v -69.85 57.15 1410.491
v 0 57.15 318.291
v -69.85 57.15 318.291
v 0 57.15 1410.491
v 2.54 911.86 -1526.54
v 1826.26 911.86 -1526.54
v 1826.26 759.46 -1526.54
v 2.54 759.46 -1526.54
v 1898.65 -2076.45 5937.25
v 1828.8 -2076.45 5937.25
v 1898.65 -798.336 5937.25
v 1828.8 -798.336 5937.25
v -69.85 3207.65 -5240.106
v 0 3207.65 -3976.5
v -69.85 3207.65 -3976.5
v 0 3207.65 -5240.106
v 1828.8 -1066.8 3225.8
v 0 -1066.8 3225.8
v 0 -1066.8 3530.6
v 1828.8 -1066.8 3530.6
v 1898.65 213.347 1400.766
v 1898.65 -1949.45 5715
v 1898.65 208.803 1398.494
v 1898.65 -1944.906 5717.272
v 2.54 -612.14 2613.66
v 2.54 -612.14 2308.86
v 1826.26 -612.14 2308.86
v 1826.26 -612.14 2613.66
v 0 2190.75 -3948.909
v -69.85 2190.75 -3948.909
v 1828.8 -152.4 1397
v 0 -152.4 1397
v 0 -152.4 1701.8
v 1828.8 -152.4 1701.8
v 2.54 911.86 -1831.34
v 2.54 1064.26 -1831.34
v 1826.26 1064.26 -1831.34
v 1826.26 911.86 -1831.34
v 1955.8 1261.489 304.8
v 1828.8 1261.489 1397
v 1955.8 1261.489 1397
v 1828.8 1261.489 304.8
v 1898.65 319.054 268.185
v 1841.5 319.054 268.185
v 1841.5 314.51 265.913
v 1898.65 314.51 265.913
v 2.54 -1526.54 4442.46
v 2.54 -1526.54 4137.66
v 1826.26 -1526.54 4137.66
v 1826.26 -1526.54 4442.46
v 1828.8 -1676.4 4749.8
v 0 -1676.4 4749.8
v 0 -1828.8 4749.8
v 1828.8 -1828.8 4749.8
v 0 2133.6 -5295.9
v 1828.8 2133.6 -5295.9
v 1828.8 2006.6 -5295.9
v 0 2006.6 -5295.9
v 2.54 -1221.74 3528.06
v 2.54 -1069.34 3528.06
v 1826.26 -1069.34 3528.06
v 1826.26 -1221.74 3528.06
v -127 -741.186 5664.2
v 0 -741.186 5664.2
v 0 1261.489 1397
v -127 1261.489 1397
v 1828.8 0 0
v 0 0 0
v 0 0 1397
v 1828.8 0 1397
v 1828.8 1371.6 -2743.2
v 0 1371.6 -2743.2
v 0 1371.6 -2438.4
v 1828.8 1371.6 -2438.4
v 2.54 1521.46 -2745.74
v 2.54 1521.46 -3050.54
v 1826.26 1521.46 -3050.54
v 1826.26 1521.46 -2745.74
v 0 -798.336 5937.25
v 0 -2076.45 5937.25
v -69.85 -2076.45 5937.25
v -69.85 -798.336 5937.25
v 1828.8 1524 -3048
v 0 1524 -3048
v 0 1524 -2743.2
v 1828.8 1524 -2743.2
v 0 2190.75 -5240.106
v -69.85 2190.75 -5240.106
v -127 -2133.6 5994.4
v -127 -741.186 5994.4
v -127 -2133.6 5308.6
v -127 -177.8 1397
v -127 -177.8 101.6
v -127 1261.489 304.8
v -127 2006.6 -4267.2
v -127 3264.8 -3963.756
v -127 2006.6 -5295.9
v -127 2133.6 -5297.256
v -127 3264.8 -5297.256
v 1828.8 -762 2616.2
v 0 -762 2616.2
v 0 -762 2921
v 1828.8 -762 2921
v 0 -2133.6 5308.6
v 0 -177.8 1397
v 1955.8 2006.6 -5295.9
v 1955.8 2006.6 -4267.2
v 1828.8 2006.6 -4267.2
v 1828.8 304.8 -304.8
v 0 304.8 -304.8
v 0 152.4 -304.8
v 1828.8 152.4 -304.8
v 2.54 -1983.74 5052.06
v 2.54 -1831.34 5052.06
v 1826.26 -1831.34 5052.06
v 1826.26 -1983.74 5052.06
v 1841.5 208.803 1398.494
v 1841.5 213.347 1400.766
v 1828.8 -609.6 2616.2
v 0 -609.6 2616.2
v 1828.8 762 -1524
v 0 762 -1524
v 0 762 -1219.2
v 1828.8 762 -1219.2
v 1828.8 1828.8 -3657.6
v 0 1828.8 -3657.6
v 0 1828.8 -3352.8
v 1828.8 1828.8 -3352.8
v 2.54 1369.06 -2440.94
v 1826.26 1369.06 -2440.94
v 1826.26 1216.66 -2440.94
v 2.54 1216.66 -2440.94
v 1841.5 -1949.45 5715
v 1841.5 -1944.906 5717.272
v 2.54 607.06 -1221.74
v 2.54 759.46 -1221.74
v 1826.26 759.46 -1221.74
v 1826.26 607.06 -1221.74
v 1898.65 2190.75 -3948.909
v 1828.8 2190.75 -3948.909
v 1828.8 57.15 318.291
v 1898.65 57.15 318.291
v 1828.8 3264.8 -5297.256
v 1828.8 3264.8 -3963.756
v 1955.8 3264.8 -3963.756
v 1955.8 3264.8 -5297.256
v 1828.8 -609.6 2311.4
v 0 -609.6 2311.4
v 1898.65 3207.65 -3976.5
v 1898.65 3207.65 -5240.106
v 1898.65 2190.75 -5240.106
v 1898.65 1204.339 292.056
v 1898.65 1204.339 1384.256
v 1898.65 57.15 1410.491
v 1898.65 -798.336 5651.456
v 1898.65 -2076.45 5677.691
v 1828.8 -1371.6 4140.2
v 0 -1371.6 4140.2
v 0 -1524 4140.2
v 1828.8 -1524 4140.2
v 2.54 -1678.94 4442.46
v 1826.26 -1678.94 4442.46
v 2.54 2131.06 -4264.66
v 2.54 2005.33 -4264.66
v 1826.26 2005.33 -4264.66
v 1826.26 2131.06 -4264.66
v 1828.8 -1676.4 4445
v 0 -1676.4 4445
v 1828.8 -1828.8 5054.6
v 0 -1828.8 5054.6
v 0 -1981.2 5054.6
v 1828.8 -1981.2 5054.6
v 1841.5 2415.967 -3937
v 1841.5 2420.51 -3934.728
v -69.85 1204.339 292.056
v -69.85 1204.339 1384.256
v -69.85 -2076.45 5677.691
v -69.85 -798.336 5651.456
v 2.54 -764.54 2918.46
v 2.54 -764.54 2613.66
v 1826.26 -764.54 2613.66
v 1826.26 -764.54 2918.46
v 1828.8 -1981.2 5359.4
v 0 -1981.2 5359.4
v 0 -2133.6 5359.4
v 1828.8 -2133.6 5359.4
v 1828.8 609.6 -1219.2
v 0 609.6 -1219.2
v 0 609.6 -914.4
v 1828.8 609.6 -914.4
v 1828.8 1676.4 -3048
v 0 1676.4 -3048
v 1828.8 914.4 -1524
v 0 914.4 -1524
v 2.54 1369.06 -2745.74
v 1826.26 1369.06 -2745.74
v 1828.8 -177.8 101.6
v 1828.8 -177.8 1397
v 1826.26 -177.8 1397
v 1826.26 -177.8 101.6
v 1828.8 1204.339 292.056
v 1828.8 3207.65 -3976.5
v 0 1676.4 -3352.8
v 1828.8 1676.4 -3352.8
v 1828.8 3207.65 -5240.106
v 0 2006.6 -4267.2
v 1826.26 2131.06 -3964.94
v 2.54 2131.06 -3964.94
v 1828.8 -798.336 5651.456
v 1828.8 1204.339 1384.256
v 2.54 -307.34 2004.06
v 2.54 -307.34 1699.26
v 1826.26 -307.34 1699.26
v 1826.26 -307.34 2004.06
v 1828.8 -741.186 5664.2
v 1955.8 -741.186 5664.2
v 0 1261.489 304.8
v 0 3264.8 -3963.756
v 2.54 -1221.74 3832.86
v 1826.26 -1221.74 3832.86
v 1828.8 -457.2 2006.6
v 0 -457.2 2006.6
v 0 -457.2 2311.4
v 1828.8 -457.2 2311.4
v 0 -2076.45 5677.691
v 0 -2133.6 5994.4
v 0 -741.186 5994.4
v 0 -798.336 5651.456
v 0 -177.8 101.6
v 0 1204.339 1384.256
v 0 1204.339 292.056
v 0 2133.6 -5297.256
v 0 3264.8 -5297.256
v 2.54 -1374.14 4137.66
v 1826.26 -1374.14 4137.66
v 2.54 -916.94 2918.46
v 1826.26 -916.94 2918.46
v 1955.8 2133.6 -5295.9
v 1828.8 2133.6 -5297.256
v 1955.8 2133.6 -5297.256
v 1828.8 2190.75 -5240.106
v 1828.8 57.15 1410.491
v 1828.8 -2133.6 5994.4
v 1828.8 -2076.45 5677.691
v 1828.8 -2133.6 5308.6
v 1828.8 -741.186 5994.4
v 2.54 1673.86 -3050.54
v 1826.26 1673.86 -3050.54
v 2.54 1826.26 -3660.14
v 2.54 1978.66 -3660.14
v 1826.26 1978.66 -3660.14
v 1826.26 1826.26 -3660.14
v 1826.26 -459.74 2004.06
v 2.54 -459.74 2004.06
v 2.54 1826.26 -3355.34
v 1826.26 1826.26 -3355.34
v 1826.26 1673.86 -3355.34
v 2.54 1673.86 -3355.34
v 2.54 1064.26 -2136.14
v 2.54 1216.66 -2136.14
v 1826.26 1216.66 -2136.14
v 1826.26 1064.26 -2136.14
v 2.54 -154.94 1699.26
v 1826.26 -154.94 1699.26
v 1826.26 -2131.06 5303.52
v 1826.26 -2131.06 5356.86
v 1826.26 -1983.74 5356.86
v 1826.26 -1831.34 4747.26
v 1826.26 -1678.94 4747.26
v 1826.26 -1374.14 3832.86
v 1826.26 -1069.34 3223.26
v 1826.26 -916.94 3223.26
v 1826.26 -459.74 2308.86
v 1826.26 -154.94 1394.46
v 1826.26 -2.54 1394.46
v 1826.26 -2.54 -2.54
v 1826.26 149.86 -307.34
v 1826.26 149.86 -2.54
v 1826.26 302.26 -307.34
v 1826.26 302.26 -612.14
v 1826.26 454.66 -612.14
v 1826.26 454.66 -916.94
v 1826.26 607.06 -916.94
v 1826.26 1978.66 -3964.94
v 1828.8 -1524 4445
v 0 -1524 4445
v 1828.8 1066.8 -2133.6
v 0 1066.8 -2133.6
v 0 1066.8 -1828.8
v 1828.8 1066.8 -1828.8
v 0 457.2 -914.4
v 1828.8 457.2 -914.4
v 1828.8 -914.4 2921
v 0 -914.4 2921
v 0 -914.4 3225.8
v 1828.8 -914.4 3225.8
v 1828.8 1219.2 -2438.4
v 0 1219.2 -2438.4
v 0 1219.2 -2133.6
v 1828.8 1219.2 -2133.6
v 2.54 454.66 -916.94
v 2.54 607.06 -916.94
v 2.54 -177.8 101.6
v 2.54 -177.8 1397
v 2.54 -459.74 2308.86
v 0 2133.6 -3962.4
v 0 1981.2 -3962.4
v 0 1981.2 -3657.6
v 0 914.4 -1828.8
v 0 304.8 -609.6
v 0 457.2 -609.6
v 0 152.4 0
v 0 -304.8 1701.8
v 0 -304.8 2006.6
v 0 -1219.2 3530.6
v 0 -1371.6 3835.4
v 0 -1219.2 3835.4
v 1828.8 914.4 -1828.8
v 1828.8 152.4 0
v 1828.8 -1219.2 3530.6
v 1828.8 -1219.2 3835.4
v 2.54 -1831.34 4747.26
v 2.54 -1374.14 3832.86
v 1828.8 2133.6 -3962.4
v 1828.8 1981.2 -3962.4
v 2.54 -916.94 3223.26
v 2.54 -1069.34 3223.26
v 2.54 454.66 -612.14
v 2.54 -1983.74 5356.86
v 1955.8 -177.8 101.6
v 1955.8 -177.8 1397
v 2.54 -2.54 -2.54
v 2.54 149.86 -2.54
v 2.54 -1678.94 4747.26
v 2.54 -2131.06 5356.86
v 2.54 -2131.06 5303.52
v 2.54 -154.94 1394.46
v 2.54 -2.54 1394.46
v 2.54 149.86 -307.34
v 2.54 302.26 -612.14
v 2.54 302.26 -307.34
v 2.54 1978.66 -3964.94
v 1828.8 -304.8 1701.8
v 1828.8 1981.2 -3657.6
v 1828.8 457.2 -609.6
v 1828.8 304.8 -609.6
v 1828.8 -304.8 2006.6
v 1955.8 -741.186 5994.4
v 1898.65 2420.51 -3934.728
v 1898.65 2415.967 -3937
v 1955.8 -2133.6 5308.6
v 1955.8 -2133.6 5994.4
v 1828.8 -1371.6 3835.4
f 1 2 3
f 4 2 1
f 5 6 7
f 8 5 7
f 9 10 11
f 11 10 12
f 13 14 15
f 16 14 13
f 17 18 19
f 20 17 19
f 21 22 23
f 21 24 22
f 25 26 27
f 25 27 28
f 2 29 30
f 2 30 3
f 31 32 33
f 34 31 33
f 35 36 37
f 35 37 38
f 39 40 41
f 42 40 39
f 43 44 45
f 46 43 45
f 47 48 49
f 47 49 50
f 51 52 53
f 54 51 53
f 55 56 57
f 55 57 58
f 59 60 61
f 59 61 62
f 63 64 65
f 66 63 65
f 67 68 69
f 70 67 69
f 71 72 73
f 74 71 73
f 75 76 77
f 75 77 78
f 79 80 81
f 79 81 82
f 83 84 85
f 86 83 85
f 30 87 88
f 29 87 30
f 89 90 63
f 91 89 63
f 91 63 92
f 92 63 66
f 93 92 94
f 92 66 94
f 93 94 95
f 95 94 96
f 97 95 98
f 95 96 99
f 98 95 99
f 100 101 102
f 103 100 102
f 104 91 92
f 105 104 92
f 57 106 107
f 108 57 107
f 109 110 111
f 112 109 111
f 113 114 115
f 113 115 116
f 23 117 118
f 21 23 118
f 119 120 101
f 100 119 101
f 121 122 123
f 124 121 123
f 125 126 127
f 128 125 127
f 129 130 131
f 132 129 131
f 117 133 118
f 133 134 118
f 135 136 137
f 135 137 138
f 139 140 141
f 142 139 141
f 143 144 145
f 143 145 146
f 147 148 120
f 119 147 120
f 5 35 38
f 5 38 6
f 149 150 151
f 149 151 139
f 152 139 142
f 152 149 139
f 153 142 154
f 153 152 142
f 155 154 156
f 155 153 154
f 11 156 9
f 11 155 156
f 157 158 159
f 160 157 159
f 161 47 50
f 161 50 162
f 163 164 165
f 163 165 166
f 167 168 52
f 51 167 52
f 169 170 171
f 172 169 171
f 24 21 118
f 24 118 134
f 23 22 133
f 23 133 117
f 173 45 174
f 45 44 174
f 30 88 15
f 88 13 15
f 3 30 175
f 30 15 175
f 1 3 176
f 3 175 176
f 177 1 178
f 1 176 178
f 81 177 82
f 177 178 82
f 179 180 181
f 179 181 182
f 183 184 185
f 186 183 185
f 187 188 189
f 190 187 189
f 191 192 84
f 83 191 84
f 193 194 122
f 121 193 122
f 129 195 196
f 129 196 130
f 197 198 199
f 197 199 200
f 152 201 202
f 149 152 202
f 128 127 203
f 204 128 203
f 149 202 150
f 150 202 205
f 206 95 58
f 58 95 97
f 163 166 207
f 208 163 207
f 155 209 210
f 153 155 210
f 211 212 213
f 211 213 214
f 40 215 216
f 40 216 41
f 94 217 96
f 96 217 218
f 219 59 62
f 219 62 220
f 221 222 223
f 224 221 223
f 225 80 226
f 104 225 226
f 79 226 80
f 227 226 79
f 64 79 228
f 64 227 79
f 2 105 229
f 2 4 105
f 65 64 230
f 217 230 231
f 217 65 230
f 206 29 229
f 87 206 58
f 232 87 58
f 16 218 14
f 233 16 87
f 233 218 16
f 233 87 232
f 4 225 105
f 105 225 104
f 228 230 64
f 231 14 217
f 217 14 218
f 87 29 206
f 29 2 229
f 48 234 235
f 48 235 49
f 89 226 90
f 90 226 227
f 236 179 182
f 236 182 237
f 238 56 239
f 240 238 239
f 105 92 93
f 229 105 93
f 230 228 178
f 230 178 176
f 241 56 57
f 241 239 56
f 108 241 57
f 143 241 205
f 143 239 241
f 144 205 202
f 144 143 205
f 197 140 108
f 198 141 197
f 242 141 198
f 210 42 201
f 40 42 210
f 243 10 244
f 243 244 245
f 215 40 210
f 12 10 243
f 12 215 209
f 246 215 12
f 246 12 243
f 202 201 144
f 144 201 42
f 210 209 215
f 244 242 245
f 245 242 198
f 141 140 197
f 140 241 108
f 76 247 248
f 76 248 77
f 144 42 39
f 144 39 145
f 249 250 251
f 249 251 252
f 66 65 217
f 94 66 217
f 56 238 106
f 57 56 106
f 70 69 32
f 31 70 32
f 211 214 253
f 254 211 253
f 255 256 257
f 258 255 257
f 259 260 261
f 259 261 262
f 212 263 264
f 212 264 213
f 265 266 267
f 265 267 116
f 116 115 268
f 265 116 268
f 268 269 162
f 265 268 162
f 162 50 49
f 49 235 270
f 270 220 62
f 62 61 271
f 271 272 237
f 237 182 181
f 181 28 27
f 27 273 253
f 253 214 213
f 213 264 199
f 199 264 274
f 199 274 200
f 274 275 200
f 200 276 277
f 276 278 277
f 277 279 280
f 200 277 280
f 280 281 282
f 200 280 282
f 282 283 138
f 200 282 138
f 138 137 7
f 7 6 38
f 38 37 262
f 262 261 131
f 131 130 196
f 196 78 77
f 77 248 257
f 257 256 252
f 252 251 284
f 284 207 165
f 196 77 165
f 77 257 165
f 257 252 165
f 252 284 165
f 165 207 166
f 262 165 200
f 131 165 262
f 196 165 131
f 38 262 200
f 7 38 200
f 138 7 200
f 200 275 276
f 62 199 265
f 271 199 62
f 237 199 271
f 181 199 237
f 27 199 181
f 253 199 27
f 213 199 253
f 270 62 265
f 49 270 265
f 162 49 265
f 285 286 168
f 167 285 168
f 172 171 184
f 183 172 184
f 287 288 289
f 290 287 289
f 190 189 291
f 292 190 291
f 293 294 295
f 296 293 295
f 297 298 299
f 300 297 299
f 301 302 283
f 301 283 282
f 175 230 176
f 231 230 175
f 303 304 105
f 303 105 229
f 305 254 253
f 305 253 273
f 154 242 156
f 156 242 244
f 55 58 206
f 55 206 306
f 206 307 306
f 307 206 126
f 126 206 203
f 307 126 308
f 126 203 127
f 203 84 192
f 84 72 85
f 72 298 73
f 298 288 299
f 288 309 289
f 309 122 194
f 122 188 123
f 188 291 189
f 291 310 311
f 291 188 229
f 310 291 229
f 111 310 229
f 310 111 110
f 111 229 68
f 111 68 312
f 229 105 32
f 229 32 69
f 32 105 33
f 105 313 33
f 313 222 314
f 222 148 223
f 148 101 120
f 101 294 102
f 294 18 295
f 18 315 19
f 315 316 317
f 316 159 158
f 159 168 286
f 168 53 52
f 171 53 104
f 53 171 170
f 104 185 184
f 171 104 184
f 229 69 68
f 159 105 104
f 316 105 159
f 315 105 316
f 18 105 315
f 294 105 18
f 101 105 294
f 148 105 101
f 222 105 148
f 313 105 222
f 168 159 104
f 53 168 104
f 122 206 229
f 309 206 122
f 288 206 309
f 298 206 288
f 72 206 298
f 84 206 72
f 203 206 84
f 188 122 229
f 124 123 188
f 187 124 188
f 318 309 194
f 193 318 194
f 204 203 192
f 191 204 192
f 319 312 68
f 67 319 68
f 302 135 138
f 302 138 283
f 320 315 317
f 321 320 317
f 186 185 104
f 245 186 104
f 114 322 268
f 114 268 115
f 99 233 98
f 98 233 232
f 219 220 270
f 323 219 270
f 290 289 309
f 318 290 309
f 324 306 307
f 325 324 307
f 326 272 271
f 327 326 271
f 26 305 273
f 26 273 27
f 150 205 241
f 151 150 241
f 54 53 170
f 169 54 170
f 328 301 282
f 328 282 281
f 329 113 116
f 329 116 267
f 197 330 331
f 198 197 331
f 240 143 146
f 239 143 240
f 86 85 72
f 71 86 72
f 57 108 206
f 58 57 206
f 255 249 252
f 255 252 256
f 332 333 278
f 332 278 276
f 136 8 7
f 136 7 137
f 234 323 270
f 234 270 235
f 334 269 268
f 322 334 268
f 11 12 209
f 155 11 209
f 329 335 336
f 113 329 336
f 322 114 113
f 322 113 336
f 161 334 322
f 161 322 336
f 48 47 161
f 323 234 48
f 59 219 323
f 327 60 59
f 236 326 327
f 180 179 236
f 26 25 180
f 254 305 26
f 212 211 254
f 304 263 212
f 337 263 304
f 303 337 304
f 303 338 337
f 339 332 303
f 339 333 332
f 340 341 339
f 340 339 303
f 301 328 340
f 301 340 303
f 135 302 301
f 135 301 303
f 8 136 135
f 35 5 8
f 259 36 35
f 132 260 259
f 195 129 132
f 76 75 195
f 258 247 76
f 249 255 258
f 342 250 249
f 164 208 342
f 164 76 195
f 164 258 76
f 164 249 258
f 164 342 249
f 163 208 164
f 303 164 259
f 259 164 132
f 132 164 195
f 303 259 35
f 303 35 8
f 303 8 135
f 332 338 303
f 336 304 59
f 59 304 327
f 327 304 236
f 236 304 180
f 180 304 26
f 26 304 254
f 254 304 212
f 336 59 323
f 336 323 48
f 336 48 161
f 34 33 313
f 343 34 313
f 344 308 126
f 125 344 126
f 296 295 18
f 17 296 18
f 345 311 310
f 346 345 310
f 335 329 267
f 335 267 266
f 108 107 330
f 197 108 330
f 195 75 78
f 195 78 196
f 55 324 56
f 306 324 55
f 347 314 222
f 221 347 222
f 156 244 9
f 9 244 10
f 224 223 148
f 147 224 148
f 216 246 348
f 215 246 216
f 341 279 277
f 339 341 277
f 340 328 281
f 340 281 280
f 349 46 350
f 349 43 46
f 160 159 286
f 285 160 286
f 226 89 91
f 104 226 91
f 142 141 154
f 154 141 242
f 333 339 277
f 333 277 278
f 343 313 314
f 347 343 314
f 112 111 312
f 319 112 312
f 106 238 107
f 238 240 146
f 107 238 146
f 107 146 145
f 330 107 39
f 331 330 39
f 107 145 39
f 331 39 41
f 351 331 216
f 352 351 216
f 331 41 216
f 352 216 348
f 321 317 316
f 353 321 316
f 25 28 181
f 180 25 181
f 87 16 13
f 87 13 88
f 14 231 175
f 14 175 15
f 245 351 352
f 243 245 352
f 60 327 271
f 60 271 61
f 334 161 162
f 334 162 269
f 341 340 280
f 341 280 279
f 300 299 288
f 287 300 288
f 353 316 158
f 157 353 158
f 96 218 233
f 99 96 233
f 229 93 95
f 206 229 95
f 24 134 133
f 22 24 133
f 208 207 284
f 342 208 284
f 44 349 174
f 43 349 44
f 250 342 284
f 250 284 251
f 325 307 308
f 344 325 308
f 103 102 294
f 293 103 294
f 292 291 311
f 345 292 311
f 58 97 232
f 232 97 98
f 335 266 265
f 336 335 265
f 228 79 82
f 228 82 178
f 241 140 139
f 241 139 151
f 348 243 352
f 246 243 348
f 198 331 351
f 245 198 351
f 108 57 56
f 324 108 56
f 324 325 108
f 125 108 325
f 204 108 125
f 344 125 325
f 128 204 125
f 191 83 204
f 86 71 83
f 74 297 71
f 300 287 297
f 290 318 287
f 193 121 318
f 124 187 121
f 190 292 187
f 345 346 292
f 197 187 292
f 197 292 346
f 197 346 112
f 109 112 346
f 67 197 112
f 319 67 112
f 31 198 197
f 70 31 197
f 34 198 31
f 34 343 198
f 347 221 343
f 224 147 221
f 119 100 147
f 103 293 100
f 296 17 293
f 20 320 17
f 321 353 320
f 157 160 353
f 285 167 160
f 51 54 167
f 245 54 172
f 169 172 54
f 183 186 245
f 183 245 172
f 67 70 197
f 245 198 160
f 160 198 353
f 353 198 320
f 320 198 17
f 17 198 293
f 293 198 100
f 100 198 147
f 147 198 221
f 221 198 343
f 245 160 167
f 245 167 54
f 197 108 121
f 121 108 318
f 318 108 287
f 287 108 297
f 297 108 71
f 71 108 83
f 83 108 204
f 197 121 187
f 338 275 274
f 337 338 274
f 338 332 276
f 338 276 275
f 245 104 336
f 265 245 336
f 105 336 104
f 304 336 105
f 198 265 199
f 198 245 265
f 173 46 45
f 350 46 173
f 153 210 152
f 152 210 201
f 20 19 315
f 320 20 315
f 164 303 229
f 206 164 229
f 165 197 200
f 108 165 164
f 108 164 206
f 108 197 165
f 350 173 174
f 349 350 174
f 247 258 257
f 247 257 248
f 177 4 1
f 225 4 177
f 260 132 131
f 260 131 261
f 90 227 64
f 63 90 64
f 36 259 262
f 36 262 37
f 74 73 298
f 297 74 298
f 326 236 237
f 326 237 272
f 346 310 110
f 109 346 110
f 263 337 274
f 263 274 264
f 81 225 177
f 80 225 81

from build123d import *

# Parameters (mm, degrees)
BOSS_EXTRUDE1_DEPTH     = 1828.8
BOSS_EXTRUDE4_DEPTH     = 127
BOSS_EXTRUDE15_DEPTH    = 127
CUT_EXTRUDE2_DEPTH      = 7101.486050415
CUT_EXTRUDE2_DEPTH_BACK = 7101.486050415
SHELL1_T                = -2.54
SKETCH11_W              = 1828.8
SKETCH11_H              = 127
BOSS_EXTRUDE16_DEPTH    = 1028.7
SHELL2_T                = -57.15
SHELL3_T                = -57.15
BOSS_EXTRUDE20_DEPTH    = 127
BOSS_EXTRUDE21_DEPTH    = 127
BOSS_EXTRUDE22_DEPTH    = 57.15
BOSS_EXTRUDE22_2_DEPTH  = 57.15


with BuildPart() as part:
    # Sketch1 → Boss-Extrude1 (new body)
    with BuildSketch(Plane(origin=(0, 0, 0), x_dir=(0, 0, -1), z_dir=(1, 0, 0))):
        Polygon((4267.2, -2133.6), (4267.2, 0), (4267.2, 2133.6), (3962.4, 2133.6), (3962.4, 1981.2), (3657.6, 1981.2), (3657.6, 1828.8), (3352.8, 1828.8), (3352.8, 1676.4), (3048, 1676.4), (3048, 1524), (2743.2, 1524), (2743.2, 1371.6), (2438.4, 1371.6), (2438.4, 1219.2), (2133.6, 1219.2), (2133.6, 1066.8), (1828.8, 1066.8), (1828.8, 914.4), (1524, 914.4), (1524, 762), (1219.2, 762), (1219.2, 609.6), (914.4, 609.6), (914.4, 457.2), (609.6, 457.2), (609.6, 304.8), (304.8, 304.8), (304.8, 152.4), (0, 152.4), (0, 0), (-1397, 0), (-1397, -152.4), (-1701.8, -152.4), (-1701.8, -304.8), (-2006.6, -304.8), (-2006.6, -457.2), (-2311.4, -457.2), (-2311.4, -609.6), (-2616.2, -609.6), (-2616.2, -762), (-2921, -762), (-2921, -914.4), (-3225.8, -914.4), (-3225.8, -1066.8), (-3530.6, -1066.8), (-3530.6, -1219.2), (-3835.4, -1219.2), (-3835.4, -1371.6), (-4140.2, -1371.6), (-4140.2, -1524), (-4445, -1524), (-4445, -1676.4), (-4749.8, -1676.4), (-4749.8, -1828.8), (-5054.6, -1828.8), (-5054.6, -1981.2), (-5359.4, -1981.2), (-5359.4, -2133.6), align=None)
    extrude(amount=BOSS_EXTRUDE1_DEPTH)

    # Sketch10 → Cut-Extrude2 (cut, two sides: drawn at the far end of the back side and taken through both)
    with BuildSketch(Plane.ZY.offset(-CUT_EXTRUDE2_DEPTH_BACK)):
        Polygon((-4267.2, 2006.6), (-4267.2, -2133.6), (5308.6, -2133.6), (1397, -177.8), (101.6, -177.8), align=None)
    extrude(amount=CUT_EXTRUDE2_DEPTH + CUT_EXTRUDE2_DEPTH_BACK, mode=Mode.SUBTRACT)

    # Shell1
    shell1_openings = [part.faces().sort_by_distance(p)[0] for p in [
        (914.4, 914.4, -2082.8),
        (914.4, -177.8, 749.3),
        (914.4, -1155.7, 3352.8),
    ]]
    offset(amount=SHELL1_T, openings=shell1_openings, kind=Kind.INTERSECTION)

    # Sketch11 → Boss-Extrude16 (add)
    with BuildSketch(Plane(origin=(0, 0, -4267.2), x_dir=(-1, 0, 0), z_dir=(0, 0, -1))):
        with Locations((-914.4, 2070.1)):
            Rectangle(SKETCH11_W, SKETCH11_H)
    extrude(amount=BOSS_EXTRUDE16_DEPTH)


with BuildPart() as body_2:
    # Sketch3 → Boss-Extrude4 (new body)
    with BuildSketch(Plane(origin=(1828.8, 0, 0), x_dir=(0, 0, -1), z_dir=(1, 0, 0))):
        Polygon((-5994.4, -741.185974285), (-5664.2, -741.185974285), (-1397, 1261.4887112), (-304.8, 1261.4887112), (3963.755826751, 3264.799710876), (5297.255826751, 3264.799710876), (5297.255826751, 2133.6), (4267.2, 2133.6), (3962.4, 2133.6), (-304.8, 0), (-1397, 0), (-5664.2, -2133.6), (-5994.4, -2133.6), align=None)
    extrude(amount=BOSS_EXTRUDE4_DEPTH)

    # Shell2
    shell2_openings = [body_2.faces().sort_by_distance(p)[0] for p in [
        (1828.8, 730.093420749, 560.935464683),
    ]]
    offset(amount=SHELL2_T, openings=shell2_openings, kind=Kind.INTERSECTION)

    # Sketch17 → Boss-Extrude20 (add)
    with BuildSketch(Plane(origin=(1955.8, 0, 0), x_dir=(0, 0, -1), z_dir=(1, 0, 0))):
        Polygon((5295.9, 2133.6), (5295.9, 2006.6), (4267.2, 2006.6), (-101.6, -177.8), (-1397, -177.8), (-5308.6, -2133.6), (-5664.2, -2133.6), (-1397, 0), (-304.8, 0), (3962.4, 2133.6), align=None)
    extrude(amount=-BOSS_EXTRUDE20_DEPTH)


with BuildPart() as body_3:
    # Sketch4 → Boss-Extrude15 (new body)
    with BuildSketch(Plane.ZY):
        Polygon((-3962.4, 2133.6), (304.8, 0), (1397, 0), (5664.2, -2133.6), (5994.4, -2133.6), (5994.4, -741.185974285), (5664.2, -741.185974285), (1397, 1261.4887112), (304.8, 1261.4887112), (-3963.755826751, 3264.799710876), (-5297.255826751, 3264.799710876), (-5297.255826751, 2133.6), align=None)
    extrude(amount=BOSS_EXTRUDE15_DEPTH)

    # Shell3
    shell3_openings = [body_3.faces().sort_by_distance(p)[0] for p in [
        (0, 730.093420749, 560.935464683),
    ]]
    offset(amount=SHELL3_T, openings=shell3_openings, kind=Kind.INTERSECTION)

    # Sketch20 → Boss-Extrude21 (add)
    with BuildSketch(Plane.ZY.offset(127)):
        Polygon((-5297.255826751, 2133.6), (-3962.4, 2133.6), (304.8, 0), (1397, 0), (5664.2, -2133.6), (5308.6, -2133.6), (1397, -177.8), (101.6, -177.8), (-4267.2, 2006.6), (-5295.9, 2006.6), align=None)
    extrude(amount=-BOSS_EXTRUDE21_DEPTH)


with BuildPart() as body_4:
    # Sketch8 → Boss-Extrude22 (new body)
    with BuildSketch(Plane.ZY.offset(-1898.65)):
        Polygon((5715, -1949.45), (1398.494376234, 208.802811883), (1400.7662213, 213.346502013), (5717.271845065, -1944.90630987), align=None)
    extrude(amount=BOSS_EXTRUDE22_DEPTH)


with BuildPart() as body_5:
    # Sketch8 → Boss-Extrude22 2 (new body)
    with BuildSketch(Plane.ZY.offset(-1898.65)):
        Polygon((265.913370509, 314.510102927), (-3937, 2415.966788181), (-3934.728154935, 2420.510478311), (268.185215574, 319.053793057), align=None)
    extrude(amount=BOSS_EXTRUDE22_2_DEPTH)


solid = Compound([part.part, body_2.part, body_3.part, body_4.part, body_5.part])
